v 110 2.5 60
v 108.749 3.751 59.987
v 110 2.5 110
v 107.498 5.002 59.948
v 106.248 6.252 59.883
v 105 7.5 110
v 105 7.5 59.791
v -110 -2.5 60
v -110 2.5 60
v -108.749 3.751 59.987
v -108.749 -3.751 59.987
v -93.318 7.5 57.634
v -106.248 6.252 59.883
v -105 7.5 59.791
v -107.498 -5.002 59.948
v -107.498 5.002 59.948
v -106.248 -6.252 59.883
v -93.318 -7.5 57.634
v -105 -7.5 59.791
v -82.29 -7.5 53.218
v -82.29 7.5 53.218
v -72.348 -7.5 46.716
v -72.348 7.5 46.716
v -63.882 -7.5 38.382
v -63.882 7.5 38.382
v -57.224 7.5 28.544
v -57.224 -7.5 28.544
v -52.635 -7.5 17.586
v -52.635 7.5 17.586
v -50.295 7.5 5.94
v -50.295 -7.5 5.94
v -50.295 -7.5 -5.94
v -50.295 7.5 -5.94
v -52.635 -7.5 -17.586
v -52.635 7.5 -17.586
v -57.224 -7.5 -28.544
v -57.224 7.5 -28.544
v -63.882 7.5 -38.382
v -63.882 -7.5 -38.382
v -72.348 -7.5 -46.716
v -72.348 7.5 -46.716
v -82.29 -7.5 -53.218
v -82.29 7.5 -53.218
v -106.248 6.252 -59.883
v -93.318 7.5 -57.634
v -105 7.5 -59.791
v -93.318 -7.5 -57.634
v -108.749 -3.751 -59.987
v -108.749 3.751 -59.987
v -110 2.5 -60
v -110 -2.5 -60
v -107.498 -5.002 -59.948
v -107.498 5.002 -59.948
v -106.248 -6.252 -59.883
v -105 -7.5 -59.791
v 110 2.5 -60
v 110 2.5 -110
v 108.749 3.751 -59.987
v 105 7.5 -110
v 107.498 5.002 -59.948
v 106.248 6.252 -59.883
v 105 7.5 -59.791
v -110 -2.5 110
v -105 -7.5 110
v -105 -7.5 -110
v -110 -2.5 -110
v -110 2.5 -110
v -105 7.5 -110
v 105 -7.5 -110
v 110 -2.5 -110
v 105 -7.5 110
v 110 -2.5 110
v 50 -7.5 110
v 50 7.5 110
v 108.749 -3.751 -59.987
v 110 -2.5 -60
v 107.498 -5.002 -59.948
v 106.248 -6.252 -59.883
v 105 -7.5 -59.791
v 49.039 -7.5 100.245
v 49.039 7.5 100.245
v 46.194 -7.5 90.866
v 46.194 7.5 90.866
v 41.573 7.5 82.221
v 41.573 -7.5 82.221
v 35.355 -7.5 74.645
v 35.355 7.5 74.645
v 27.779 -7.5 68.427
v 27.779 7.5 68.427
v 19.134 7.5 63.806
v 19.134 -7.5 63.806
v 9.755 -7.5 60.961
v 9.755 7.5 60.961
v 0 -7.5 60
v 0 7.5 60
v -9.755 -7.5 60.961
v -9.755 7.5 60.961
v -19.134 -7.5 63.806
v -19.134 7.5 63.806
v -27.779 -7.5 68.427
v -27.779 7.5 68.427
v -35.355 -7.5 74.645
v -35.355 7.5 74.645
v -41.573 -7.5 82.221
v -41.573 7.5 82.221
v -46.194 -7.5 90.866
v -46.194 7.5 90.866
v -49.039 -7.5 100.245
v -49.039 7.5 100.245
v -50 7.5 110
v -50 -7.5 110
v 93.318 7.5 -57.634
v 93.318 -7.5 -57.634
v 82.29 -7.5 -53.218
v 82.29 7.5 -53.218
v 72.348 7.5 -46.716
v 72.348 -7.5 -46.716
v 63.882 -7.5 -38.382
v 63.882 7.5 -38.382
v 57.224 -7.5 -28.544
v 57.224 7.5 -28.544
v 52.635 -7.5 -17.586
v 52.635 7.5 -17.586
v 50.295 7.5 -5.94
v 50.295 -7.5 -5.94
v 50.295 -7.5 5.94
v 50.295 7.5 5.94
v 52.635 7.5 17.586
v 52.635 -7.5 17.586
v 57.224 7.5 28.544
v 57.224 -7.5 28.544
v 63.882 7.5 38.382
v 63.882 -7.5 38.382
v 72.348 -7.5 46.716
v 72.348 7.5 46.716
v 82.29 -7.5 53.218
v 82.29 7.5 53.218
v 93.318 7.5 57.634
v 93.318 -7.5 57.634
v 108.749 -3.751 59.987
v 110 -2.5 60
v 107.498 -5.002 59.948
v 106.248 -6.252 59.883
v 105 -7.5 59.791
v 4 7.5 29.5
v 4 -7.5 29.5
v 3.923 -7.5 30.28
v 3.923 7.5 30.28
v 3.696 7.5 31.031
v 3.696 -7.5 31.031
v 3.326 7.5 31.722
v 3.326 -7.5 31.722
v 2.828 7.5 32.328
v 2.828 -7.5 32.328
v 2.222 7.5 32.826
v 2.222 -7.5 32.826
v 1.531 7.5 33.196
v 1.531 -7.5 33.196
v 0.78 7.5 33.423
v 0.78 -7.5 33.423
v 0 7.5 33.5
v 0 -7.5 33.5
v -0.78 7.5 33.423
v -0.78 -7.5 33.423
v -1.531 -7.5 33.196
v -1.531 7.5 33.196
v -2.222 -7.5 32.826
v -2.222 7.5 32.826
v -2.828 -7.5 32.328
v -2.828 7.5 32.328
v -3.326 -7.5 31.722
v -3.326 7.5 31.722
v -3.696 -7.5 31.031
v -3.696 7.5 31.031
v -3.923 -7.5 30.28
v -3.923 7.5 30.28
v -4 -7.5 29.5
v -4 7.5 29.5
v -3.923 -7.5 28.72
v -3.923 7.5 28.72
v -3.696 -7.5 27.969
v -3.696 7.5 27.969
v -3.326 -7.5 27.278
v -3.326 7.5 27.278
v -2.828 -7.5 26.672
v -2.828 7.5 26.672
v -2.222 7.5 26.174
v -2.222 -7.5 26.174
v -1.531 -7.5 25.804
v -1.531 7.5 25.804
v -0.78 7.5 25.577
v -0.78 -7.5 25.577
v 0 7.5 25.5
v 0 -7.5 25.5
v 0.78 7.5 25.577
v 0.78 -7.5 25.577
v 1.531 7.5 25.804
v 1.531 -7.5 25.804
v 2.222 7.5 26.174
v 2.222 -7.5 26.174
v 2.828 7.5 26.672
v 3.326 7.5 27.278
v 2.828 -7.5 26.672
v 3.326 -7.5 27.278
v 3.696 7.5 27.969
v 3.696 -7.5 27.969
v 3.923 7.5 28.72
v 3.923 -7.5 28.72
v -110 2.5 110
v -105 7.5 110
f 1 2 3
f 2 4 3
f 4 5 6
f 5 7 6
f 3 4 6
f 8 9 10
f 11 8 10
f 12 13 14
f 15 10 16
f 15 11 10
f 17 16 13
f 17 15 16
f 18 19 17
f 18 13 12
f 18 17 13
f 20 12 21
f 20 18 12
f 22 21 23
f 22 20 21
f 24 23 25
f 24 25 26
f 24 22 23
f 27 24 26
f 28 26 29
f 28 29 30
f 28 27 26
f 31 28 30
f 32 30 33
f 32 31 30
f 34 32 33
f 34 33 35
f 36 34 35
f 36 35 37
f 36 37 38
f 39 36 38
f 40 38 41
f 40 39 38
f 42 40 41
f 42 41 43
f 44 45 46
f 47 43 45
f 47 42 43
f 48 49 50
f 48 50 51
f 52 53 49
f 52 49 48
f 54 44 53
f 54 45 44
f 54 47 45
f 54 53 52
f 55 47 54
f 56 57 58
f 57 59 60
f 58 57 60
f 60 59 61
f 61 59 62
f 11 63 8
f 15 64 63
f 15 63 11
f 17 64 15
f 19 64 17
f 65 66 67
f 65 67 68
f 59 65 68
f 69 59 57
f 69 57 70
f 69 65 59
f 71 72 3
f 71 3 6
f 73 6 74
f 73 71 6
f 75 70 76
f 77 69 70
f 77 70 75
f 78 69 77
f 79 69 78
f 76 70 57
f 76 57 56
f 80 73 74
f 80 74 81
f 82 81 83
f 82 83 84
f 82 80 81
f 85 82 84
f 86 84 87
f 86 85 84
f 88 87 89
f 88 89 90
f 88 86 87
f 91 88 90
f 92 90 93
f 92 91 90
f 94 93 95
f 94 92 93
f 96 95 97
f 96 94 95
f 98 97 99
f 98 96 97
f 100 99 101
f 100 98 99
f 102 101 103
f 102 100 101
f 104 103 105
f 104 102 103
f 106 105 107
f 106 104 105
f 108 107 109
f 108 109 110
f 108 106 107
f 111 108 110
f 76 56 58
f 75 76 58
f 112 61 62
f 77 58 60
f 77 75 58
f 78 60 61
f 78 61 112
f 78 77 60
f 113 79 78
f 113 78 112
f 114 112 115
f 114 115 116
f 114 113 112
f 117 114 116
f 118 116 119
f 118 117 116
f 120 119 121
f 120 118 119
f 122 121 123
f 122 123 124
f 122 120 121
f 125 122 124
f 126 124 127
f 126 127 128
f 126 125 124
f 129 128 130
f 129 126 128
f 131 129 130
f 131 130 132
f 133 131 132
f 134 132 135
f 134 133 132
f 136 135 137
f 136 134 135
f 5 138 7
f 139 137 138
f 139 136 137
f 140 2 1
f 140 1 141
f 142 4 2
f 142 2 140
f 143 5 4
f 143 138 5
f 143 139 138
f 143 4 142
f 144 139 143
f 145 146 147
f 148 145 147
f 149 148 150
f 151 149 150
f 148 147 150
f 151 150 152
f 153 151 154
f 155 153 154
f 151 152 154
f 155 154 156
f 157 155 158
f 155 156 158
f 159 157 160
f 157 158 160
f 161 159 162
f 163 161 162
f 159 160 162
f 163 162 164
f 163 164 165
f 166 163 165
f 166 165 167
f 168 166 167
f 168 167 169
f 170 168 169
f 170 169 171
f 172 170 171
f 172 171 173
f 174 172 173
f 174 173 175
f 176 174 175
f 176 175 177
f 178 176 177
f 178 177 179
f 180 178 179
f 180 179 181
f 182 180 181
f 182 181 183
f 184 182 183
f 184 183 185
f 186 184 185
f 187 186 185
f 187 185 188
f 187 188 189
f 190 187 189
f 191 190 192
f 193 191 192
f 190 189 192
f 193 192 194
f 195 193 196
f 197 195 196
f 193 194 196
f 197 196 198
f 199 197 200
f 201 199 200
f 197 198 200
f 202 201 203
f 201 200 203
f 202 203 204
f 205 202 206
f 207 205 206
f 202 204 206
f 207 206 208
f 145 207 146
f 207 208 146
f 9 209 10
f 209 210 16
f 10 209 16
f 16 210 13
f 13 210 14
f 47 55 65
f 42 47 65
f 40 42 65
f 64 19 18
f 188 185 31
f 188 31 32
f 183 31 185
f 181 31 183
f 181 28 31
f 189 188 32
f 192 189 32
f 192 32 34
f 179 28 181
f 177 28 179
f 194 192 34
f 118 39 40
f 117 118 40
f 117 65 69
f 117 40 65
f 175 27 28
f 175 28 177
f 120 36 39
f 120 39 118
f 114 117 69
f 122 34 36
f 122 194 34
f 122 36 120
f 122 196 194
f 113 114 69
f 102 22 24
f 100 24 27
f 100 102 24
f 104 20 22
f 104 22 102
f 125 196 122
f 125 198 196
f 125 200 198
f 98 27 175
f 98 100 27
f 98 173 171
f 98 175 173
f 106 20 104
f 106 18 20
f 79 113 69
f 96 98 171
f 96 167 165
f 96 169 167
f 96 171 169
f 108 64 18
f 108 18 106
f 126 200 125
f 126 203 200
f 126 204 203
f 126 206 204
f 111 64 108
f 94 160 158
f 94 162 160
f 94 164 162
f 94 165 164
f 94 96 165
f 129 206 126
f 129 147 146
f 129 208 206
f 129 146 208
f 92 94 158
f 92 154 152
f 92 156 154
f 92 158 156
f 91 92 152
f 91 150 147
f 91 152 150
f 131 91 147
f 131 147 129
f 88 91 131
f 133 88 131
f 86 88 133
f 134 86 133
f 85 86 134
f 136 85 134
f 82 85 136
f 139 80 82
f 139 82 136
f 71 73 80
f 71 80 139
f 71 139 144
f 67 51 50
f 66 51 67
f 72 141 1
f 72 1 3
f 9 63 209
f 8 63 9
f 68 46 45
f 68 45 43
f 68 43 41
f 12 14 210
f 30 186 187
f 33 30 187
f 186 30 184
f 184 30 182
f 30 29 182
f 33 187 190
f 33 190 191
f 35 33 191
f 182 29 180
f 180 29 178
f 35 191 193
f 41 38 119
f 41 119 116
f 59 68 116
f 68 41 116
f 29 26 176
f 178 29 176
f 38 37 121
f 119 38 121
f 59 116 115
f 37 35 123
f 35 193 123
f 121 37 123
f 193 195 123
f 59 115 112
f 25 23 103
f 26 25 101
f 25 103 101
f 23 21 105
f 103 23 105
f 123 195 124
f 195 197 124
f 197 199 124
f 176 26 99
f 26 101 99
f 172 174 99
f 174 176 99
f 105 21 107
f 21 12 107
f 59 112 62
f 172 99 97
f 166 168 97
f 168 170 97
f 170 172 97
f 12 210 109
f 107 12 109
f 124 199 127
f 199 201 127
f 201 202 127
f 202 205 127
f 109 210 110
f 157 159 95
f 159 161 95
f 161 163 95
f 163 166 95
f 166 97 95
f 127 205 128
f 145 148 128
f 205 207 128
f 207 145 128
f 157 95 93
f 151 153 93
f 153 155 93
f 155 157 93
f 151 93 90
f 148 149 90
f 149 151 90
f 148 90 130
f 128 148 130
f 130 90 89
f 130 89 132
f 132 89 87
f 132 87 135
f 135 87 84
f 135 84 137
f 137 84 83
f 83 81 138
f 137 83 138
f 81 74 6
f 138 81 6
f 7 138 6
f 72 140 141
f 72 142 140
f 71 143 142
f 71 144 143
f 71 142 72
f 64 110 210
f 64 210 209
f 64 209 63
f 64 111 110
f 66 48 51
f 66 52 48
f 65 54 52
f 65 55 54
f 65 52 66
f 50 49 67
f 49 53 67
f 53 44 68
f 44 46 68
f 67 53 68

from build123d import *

# Parameters (mm, degrees)
F1_DEPTH = 7.5
F2_SIZE  = 5
F5_R     = 4
F6_DEPTH = 15.001


# Not quite as in the source:
# - two fillets or chamfers of one size are made in one step


with BuildPart() as f1:
    # F0 (on Front) → F1 (new body, symmetric)
    with BuildSketch(Plane.XZ):
        with BuildLine():
            Line((110, 60), (110, 110))
            Line((110, 110), (50, 110))
            ThreePointArc((50, 110), (0, 60), (-50, 110))
            Line((-50, 110), (-110, 110))
            Line((-110, 110), (-110, 60))
            ThreePointArc((-110, 60), (-67.5735931288, 42.4264068712), (-50, 0))
            ThreePointArc((-50, 0), (-67.5735931288, -42.4264068712), (-110, -60))
            Line((-110, -60), (-110, -110))
            Line((-110, -110), (110, -110))
            Line((110, -110), (110, -60))
            ThreePointArc((110, -60), (50, 0), (110, 60))
        make_face()
    extrude(amount=F1_DEPTH, both=True)

    # F2
    f2_edges = [f1.edges().sort_by_distance(p)[0] for p in [
        (-110, 7.5, -85),
        (-110, 7.5, 85),
        (110, 7.5, 85),
        (110, 7.5, -85),
        (110, -7.5, 85),
        (110, -7.5, -85),
        (-110, -7.5, -85),
        (-110, -7.5, 85),
    ]]
    chamfer(f2_edges, length=F2_SIZE)

    # F5 (on face) → F6 (cut, through all)
    with BuildSketch(Plane.XZ.offset(7.5)):
        with Locations((0, 29.5)):
            Circle(F5_R)
    extrude(amount=-F6_DEPTH, mode=Mode.SUBTRACT)


solid = f1.part
